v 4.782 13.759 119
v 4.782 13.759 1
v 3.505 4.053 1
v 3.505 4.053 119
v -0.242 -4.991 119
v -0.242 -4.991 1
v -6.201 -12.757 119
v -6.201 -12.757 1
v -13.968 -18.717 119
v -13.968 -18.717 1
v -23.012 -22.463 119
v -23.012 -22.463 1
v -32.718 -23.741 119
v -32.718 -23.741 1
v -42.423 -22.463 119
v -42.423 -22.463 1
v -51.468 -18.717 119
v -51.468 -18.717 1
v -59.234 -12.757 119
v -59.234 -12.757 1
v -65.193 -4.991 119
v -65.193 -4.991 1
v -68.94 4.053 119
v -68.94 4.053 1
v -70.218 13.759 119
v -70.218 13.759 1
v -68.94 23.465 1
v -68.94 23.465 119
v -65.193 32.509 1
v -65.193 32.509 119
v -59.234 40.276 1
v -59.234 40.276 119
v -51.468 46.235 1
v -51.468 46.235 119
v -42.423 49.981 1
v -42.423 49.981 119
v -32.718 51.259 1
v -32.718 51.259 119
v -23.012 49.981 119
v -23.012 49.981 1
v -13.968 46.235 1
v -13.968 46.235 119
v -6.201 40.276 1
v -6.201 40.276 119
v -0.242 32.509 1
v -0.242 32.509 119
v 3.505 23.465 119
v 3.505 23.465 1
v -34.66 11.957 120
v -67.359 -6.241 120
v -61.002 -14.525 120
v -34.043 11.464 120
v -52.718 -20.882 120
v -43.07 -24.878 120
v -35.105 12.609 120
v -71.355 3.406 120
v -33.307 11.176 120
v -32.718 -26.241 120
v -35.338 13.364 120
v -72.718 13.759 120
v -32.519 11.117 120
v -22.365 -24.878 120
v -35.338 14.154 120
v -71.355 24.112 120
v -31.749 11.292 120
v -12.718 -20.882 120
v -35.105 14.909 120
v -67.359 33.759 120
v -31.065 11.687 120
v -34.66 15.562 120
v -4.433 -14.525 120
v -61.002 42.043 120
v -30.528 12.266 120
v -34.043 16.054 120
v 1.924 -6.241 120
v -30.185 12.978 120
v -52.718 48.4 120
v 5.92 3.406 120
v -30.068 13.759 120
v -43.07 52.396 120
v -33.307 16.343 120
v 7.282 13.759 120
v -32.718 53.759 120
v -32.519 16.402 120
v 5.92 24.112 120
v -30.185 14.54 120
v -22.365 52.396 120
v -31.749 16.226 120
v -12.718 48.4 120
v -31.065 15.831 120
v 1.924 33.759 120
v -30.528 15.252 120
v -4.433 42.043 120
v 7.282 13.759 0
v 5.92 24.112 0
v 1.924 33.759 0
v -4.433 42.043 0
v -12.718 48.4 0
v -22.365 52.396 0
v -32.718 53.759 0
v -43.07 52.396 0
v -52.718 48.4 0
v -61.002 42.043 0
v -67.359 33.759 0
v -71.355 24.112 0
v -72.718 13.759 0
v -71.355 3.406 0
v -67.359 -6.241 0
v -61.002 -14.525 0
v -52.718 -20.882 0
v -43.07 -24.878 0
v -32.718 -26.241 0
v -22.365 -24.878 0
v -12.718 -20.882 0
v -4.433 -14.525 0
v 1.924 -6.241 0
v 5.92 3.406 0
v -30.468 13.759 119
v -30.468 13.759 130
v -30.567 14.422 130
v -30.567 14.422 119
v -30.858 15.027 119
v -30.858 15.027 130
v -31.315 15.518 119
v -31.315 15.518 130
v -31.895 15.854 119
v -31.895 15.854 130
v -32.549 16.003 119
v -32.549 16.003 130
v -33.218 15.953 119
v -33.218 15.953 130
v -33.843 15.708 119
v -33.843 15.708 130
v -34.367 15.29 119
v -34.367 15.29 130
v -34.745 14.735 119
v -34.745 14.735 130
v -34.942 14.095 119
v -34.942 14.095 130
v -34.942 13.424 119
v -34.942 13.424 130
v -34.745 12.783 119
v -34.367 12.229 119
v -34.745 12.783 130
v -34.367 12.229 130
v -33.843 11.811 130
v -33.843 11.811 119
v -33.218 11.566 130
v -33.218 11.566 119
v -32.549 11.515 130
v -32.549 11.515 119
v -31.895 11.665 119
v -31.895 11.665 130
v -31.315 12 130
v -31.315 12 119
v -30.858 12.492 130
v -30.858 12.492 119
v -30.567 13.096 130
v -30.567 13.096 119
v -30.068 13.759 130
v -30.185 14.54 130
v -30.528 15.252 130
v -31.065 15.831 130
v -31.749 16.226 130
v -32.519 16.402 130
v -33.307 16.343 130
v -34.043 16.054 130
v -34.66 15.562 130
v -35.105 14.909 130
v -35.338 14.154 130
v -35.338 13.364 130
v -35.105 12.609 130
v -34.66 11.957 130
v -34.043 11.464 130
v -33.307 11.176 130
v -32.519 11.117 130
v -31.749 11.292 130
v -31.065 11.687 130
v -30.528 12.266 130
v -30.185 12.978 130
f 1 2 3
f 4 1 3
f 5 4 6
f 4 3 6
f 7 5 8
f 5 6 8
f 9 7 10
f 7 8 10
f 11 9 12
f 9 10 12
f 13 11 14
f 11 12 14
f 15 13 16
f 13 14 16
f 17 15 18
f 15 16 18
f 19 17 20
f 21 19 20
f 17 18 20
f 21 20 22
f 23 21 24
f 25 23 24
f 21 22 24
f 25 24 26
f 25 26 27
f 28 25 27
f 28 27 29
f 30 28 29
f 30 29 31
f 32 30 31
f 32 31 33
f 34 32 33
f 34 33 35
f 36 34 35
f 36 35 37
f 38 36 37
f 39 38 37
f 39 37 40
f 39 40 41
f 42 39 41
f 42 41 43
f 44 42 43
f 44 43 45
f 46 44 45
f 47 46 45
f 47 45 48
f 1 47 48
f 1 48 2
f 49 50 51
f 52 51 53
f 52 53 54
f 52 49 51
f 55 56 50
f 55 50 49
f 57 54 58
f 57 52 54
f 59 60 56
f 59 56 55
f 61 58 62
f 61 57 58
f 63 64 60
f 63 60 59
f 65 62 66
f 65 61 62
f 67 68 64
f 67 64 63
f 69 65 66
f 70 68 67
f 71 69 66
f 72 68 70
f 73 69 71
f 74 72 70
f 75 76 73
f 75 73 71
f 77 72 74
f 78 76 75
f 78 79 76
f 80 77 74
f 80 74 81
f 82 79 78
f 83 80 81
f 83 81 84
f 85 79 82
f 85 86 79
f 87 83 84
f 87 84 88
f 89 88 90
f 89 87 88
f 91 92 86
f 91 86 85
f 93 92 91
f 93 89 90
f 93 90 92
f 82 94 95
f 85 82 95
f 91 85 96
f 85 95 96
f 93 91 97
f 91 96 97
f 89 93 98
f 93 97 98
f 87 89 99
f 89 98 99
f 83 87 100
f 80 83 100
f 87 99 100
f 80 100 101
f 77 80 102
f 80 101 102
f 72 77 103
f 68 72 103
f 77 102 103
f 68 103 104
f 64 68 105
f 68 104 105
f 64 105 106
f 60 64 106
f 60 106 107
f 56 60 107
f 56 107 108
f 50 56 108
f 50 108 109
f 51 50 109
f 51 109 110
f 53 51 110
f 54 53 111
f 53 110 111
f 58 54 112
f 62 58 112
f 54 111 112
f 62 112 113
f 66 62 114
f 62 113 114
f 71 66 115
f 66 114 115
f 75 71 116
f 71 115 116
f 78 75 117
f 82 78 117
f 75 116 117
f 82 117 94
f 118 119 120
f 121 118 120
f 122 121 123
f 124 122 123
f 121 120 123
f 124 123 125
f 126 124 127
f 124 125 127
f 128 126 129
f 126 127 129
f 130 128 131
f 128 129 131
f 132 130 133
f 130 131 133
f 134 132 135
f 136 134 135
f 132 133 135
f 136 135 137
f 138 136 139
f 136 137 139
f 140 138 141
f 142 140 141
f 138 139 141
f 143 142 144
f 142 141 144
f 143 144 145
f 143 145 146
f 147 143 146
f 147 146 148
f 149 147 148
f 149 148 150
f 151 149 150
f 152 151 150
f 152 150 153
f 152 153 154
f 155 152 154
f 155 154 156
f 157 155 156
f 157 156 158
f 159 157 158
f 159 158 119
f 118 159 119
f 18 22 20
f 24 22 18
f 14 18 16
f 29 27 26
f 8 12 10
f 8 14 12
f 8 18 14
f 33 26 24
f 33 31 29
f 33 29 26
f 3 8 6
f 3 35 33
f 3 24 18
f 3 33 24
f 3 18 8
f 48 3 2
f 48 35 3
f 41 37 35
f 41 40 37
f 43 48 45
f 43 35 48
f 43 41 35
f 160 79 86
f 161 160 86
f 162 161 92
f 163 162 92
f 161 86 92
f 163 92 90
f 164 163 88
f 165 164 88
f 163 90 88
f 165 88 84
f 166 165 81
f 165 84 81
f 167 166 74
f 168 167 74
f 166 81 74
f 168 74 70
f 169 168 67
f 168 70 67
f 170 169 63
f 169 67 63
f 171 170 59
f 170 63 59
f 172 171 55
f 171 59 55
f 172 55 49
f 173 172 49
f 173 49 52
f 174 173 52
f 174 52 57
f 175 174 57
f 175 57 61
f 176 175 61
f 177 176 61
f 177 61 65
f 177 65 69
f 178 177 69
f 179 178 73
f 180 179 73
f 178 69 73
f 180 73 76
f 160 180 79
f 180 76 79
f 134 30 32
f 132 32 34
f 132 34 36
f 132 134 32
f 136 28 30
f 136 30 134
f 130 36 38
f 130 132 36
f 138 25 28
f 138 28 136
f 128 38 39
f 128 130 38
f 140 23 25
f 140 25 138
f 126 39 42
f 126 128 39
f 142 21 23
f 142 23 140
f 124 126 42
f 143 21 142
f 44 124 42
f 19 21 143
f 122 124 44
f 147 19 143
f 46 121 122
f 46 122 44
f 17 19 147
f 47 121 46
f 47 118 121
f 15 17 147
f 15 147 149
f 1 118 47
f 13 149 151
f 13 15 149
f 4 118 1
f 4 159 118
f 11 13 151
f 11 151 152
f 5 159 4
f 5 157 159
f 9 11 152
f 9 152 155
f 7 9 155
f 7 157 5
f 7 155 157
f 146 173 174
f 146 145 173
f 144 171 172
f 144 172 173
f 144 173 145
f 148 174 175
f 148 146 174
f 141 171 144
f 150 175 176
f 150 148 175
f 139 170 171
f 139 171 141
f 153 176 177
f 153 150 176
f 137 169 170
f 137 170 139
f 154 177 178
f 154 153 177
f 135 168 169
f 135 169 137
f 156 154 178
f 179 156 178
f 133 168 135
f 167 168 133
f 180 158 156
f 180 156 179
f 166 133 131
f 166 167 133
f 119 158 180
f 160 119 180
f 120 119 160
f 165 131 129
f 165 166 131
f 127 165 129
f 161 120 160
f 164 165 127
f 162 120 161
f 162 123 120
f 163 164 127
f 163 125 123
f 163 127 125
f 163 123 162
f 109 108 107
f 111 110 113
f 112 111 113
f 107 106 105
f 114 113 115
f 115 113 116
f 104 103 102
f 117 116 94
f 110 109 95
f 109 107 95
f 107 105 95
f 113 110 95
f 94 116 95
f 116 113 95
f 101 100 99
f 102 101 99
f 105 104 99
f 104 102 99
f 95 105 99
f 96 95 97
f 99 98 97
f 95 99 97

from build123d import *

# Parameters (mm, degrees)
F0_R     = 40
F1_DEPTH = 120
F2_R     = 2.65
F3_DEPTH = 10
F4_R     = 2.25
F5_DEPTH = 25
F6_R     = 37.5
F7_DEPTH = 119
F8_R     = 39.694818
F9_DEPTH = 1


with BuildPart() as f1:
    # F0 (on Top) → F1 (new body)
    with BuildSketch(Plane.XY):
        with Locations((-32.717515, 13.759183)):
            Circle(F0_R)
    extrude(amount=F1_DEPTH)

    # F2 (on face) → F3 (join)
    with BuildSketch(Plane.XY.offset(120)):
        with Locations((-32.717515, 13.759183)):
            Circle(F2_R)
    extrude(amount=F3_DEPTH)

    # F4 (on face) → F5 (cut)
    with BuildSketch(Plane.XY.offset(130)):
        with Locations((-32.717515, 13.759183)):
            Circle(F4_R)
    extrude(amount=-F5_DEPTH, mode=Mode.SUBTRACT)

    # F6 (on face) → F7 (cut)
    with BuildSketch(Plane(origin=(0, 0, 0), x_dir=(1, 0, 0), z_dir=(0, 0, -1))):
        with Locations((-32.717515, -13.759183)):
            Circle(F6_R)
    extrude(amount=-F7_DEPTH, mode=Mode.SUBTRACT)

    # F8 (on Top) → F9 (join)
    with BuildSketch(Plane.XY):
        with Locations((-32.779191, 13.591371)):
            Circle(F8_R)
    extrude(amount=F9_DEPTH)


solid = f1.part
